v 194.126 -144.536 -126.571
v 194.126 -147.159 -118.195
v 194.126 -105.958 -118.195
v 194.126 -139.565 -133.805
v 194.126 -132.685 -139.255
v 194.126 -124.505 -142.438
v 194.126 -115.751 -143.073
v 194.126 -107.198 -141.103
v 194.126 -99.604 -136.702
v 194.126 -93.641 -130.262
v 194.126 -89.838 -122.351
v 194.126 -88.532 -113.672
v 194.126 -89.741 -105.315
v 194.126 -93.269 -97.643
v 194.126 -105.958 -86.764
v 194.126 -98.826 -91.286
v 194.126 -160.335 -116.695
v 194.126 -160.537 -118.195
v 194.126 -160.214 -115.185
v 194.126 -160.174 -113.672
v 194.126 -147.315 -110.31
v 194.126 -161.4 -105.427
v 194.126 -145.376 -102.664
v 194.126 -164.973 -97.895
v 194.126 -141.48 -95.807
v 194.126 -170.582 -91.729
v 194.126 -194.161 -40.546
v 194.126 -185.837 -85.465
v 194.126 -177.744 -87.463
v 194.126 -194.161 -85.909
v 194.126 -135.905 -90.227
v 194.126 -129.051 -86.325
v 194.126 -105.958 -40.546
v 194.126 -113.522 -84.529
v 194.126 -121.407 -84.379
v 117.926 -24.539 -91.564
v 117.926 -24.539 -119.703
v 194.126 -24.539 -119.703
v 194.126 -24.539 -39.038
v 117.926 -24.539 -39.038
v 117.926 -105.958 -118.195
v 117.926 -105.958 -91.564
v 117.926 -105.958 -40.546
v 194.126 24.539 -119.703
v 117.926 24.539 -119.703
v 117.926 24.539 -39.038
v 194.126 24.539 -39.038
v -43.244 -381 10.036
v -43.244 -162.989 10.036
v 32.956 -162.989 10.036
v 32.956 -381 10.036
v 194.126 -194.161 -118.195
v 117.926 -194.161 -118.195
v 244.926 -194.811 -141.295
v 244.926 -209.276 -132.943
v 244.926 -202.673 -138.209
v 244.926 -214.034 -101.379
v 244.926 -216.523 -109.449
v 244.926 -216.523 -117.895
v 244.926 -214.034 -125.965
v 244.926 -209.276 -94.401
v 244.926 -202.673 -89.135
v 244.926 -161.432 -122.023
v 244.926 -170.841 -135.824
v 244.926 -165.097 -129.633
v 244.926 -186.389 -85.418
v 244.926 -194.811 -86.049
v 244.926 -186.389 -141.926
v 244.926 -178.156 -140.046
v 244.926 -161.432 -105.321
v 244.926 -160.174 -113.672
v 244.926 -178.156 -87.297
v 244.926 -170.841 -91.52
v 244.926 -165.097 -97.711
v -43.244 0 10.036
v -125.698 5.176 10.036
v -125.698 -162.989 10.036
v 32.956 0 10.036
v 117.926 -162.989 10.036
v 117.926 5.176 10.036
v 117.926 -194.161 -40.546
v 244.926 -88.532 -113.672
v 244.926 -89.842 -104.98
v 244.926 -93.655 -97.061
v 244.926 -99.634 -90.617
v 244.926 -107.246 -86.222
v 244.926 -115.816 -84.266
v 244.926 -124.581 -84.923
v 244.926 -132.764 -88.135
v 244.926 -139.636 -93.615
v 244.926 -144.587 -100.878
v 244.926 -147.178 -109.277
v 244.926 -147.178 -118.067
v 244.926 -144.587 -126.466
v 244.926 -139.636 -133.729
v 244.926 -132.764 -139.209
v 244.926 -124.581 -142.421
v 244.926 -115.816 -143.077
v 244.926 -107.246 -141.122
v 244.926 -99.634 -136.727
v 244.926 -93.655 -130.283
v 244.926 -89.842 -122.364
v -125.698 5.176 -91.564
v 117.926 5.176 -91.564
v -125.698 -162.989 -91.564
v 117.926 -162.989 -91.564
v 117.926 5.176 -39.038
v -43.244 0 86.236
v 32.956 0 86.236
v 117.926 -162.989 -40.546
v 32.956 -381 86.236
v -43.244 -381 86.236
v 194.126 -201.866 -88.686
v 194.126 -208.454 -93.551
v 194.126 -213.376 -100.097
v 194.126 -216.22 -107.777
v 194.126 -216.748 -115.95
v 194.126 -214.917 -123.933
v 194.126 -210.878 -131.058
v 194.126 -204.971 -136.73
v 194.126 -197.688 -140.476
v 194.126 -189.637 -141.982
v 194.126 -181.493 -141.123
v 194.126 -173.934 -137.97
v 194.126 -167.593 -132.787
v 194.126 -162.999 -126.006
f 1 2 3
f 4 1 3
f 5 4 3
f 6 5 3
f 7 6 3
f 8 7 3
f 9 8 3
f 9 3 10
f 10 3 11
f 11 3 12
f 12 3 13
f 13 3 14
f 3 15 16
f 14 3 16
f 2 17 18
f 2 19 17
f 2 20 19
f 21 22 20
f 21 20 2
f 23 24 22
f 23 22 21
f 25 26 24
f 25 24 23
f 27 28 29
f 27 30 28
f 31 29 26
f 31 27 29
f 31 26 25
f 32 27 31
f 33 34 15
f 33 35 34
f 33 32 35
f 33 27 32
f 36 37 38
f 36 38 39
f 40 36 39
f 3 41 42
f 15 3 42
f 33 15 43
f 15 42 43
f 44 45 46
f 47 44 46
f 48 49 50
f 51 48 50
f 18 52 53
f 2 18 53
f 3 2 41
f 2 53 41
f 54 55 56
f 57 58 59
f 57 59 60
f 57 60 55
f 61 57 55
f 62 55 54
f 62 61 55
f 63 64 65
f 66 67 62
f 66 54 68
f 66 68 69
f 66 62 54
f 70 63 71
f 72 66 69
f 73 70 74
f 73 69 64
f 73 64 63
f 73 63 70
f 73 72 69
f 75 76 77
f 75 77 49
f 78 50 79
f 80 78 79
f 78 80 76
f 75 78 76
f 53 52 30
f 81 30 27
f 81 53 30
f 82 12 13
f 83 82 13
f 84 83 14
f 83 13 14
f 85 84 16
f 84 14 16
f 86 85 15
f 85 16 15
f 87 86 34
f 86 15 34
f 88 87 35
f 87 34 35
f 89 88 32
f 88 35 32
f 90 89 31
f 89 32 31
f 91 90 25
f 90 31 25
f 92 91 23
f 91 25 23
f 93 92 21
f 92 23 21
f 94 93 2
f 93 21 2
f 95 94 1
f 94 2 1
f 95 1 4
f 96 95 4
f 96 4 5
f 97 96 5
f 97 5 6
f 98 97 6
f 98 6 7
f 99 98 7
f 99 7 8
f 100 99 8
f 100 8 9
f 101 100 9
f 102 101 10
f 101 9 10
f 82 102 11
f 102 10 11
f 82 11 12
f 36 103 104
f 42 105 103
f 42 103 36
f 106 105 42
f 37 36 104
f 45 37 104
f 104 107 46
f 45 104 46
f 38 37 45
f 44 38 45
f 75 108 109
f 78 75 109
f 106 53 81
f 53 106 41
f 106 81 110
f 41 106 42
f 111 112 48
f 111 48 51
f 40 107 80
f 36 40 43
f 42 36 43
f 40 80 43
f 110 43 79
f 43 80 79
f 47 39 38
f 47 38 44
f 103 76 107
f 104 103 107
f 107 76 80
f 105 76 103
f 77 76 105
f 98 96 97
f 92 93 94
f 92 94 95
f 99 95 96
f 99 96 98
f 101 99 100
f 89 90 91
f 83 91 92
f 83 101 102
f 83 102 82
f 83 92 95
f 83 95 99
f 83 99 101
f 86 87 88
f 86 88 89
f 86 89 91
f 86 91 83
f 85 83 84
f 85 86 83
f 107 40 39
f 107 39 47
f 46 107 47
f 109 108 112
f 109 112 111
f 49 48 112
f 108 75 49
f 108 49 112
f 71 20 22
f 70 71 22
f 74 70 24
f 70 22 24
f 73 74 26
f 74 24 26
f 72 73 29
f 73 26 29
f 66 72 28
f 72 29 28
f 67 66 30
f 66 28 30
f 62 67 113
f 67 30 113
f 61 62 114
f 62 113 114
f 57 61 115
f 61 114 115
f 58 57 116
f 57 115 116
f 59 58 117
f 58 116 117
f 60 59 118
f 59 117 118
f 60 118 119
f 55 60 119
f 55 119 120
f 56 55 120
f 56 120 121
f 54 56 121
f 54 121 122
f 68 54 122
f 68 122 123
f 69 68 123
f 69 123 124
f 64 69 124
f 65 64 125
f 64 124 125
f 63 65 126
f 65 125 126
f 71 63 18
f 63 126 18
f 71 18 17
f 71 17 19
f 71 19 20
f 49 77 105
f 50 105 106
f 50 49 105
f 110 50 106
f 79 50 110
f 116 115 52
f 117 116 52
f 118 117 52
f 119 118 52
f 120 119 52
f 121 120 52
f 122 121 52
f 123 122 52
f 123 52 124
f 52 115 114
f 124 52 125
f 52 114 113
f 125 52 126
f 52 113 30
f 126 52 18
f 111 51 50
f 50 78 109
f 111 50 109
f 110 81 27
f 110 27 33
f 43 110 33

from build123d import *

# Parameters (mm, degrees)
F0_W     = 76.2
F0_H     = 76.2
F1_DEPTH = 381
F4_W     = 243.6232632026
F4_H     = 168.1647449732
F5_DEPTH = 101.6
F6_W     = 88.2032513618
F6_H     = 77.649012208
F6_W_2   = 49.0783378482
F6_H_2   = 80.6645080447
F7_DEPTH = 76.2
F8_R     = 28.3330362408
F8_R_2   = 29.4879309961
F9_DEPTH = 50.8


# Not quite as in the source:
# - the program builds the solid bodies; features that only make, move or delete a surface that nothing else refers to are left out


with BuildPart() as f1:
    # F0 (on Front) → F1 (new body)
    with BuildSketch(Plane.XZ):
        with Locations((-5.1436224073, 48.1359618664)):
            Rectangle(F0_W, F0_H)
    extrude(amount=F1_DEPTH)

    # F4 (on face) → F5 (join)
    with BuildSketch(Plane(origin=(0, 0, 10.0359618664), x_dir=(1, 0, 0), z_dir=(0, 0, -1))):
        with Locations((-3.8859811611, 78.9063498378)):
            Rectangle(F4_W, F4_H)
    extrude(amount=F5_DEPTH)

    # F6 (on face) → F7 (join)
    with BuildSketch(Plane.YZ.offset(117.9256504402)):
        with Locations((-150.0591784716, -79.3707072735)):
            Rectangle(F6_W, F6_H)
        with Locations((0, -79.3707072735)):
            Rectangle(F6_W_2, F6_H_2)
    extrude(amount=F7_DEPTH)

    # F8 (on face) → F9 (join)
    with BuildSketch(Plane.YZ.offset(194.1256504402)):
        with Locations((-188.5067522526, -113.6719733477)):
            Circle(F8_R)
        with Locations((-118.0195510387, -113.6719733477)):
            Circle(F8_R_2)
    extrude(amount=F9_DEPTH)


solid = f1.part
